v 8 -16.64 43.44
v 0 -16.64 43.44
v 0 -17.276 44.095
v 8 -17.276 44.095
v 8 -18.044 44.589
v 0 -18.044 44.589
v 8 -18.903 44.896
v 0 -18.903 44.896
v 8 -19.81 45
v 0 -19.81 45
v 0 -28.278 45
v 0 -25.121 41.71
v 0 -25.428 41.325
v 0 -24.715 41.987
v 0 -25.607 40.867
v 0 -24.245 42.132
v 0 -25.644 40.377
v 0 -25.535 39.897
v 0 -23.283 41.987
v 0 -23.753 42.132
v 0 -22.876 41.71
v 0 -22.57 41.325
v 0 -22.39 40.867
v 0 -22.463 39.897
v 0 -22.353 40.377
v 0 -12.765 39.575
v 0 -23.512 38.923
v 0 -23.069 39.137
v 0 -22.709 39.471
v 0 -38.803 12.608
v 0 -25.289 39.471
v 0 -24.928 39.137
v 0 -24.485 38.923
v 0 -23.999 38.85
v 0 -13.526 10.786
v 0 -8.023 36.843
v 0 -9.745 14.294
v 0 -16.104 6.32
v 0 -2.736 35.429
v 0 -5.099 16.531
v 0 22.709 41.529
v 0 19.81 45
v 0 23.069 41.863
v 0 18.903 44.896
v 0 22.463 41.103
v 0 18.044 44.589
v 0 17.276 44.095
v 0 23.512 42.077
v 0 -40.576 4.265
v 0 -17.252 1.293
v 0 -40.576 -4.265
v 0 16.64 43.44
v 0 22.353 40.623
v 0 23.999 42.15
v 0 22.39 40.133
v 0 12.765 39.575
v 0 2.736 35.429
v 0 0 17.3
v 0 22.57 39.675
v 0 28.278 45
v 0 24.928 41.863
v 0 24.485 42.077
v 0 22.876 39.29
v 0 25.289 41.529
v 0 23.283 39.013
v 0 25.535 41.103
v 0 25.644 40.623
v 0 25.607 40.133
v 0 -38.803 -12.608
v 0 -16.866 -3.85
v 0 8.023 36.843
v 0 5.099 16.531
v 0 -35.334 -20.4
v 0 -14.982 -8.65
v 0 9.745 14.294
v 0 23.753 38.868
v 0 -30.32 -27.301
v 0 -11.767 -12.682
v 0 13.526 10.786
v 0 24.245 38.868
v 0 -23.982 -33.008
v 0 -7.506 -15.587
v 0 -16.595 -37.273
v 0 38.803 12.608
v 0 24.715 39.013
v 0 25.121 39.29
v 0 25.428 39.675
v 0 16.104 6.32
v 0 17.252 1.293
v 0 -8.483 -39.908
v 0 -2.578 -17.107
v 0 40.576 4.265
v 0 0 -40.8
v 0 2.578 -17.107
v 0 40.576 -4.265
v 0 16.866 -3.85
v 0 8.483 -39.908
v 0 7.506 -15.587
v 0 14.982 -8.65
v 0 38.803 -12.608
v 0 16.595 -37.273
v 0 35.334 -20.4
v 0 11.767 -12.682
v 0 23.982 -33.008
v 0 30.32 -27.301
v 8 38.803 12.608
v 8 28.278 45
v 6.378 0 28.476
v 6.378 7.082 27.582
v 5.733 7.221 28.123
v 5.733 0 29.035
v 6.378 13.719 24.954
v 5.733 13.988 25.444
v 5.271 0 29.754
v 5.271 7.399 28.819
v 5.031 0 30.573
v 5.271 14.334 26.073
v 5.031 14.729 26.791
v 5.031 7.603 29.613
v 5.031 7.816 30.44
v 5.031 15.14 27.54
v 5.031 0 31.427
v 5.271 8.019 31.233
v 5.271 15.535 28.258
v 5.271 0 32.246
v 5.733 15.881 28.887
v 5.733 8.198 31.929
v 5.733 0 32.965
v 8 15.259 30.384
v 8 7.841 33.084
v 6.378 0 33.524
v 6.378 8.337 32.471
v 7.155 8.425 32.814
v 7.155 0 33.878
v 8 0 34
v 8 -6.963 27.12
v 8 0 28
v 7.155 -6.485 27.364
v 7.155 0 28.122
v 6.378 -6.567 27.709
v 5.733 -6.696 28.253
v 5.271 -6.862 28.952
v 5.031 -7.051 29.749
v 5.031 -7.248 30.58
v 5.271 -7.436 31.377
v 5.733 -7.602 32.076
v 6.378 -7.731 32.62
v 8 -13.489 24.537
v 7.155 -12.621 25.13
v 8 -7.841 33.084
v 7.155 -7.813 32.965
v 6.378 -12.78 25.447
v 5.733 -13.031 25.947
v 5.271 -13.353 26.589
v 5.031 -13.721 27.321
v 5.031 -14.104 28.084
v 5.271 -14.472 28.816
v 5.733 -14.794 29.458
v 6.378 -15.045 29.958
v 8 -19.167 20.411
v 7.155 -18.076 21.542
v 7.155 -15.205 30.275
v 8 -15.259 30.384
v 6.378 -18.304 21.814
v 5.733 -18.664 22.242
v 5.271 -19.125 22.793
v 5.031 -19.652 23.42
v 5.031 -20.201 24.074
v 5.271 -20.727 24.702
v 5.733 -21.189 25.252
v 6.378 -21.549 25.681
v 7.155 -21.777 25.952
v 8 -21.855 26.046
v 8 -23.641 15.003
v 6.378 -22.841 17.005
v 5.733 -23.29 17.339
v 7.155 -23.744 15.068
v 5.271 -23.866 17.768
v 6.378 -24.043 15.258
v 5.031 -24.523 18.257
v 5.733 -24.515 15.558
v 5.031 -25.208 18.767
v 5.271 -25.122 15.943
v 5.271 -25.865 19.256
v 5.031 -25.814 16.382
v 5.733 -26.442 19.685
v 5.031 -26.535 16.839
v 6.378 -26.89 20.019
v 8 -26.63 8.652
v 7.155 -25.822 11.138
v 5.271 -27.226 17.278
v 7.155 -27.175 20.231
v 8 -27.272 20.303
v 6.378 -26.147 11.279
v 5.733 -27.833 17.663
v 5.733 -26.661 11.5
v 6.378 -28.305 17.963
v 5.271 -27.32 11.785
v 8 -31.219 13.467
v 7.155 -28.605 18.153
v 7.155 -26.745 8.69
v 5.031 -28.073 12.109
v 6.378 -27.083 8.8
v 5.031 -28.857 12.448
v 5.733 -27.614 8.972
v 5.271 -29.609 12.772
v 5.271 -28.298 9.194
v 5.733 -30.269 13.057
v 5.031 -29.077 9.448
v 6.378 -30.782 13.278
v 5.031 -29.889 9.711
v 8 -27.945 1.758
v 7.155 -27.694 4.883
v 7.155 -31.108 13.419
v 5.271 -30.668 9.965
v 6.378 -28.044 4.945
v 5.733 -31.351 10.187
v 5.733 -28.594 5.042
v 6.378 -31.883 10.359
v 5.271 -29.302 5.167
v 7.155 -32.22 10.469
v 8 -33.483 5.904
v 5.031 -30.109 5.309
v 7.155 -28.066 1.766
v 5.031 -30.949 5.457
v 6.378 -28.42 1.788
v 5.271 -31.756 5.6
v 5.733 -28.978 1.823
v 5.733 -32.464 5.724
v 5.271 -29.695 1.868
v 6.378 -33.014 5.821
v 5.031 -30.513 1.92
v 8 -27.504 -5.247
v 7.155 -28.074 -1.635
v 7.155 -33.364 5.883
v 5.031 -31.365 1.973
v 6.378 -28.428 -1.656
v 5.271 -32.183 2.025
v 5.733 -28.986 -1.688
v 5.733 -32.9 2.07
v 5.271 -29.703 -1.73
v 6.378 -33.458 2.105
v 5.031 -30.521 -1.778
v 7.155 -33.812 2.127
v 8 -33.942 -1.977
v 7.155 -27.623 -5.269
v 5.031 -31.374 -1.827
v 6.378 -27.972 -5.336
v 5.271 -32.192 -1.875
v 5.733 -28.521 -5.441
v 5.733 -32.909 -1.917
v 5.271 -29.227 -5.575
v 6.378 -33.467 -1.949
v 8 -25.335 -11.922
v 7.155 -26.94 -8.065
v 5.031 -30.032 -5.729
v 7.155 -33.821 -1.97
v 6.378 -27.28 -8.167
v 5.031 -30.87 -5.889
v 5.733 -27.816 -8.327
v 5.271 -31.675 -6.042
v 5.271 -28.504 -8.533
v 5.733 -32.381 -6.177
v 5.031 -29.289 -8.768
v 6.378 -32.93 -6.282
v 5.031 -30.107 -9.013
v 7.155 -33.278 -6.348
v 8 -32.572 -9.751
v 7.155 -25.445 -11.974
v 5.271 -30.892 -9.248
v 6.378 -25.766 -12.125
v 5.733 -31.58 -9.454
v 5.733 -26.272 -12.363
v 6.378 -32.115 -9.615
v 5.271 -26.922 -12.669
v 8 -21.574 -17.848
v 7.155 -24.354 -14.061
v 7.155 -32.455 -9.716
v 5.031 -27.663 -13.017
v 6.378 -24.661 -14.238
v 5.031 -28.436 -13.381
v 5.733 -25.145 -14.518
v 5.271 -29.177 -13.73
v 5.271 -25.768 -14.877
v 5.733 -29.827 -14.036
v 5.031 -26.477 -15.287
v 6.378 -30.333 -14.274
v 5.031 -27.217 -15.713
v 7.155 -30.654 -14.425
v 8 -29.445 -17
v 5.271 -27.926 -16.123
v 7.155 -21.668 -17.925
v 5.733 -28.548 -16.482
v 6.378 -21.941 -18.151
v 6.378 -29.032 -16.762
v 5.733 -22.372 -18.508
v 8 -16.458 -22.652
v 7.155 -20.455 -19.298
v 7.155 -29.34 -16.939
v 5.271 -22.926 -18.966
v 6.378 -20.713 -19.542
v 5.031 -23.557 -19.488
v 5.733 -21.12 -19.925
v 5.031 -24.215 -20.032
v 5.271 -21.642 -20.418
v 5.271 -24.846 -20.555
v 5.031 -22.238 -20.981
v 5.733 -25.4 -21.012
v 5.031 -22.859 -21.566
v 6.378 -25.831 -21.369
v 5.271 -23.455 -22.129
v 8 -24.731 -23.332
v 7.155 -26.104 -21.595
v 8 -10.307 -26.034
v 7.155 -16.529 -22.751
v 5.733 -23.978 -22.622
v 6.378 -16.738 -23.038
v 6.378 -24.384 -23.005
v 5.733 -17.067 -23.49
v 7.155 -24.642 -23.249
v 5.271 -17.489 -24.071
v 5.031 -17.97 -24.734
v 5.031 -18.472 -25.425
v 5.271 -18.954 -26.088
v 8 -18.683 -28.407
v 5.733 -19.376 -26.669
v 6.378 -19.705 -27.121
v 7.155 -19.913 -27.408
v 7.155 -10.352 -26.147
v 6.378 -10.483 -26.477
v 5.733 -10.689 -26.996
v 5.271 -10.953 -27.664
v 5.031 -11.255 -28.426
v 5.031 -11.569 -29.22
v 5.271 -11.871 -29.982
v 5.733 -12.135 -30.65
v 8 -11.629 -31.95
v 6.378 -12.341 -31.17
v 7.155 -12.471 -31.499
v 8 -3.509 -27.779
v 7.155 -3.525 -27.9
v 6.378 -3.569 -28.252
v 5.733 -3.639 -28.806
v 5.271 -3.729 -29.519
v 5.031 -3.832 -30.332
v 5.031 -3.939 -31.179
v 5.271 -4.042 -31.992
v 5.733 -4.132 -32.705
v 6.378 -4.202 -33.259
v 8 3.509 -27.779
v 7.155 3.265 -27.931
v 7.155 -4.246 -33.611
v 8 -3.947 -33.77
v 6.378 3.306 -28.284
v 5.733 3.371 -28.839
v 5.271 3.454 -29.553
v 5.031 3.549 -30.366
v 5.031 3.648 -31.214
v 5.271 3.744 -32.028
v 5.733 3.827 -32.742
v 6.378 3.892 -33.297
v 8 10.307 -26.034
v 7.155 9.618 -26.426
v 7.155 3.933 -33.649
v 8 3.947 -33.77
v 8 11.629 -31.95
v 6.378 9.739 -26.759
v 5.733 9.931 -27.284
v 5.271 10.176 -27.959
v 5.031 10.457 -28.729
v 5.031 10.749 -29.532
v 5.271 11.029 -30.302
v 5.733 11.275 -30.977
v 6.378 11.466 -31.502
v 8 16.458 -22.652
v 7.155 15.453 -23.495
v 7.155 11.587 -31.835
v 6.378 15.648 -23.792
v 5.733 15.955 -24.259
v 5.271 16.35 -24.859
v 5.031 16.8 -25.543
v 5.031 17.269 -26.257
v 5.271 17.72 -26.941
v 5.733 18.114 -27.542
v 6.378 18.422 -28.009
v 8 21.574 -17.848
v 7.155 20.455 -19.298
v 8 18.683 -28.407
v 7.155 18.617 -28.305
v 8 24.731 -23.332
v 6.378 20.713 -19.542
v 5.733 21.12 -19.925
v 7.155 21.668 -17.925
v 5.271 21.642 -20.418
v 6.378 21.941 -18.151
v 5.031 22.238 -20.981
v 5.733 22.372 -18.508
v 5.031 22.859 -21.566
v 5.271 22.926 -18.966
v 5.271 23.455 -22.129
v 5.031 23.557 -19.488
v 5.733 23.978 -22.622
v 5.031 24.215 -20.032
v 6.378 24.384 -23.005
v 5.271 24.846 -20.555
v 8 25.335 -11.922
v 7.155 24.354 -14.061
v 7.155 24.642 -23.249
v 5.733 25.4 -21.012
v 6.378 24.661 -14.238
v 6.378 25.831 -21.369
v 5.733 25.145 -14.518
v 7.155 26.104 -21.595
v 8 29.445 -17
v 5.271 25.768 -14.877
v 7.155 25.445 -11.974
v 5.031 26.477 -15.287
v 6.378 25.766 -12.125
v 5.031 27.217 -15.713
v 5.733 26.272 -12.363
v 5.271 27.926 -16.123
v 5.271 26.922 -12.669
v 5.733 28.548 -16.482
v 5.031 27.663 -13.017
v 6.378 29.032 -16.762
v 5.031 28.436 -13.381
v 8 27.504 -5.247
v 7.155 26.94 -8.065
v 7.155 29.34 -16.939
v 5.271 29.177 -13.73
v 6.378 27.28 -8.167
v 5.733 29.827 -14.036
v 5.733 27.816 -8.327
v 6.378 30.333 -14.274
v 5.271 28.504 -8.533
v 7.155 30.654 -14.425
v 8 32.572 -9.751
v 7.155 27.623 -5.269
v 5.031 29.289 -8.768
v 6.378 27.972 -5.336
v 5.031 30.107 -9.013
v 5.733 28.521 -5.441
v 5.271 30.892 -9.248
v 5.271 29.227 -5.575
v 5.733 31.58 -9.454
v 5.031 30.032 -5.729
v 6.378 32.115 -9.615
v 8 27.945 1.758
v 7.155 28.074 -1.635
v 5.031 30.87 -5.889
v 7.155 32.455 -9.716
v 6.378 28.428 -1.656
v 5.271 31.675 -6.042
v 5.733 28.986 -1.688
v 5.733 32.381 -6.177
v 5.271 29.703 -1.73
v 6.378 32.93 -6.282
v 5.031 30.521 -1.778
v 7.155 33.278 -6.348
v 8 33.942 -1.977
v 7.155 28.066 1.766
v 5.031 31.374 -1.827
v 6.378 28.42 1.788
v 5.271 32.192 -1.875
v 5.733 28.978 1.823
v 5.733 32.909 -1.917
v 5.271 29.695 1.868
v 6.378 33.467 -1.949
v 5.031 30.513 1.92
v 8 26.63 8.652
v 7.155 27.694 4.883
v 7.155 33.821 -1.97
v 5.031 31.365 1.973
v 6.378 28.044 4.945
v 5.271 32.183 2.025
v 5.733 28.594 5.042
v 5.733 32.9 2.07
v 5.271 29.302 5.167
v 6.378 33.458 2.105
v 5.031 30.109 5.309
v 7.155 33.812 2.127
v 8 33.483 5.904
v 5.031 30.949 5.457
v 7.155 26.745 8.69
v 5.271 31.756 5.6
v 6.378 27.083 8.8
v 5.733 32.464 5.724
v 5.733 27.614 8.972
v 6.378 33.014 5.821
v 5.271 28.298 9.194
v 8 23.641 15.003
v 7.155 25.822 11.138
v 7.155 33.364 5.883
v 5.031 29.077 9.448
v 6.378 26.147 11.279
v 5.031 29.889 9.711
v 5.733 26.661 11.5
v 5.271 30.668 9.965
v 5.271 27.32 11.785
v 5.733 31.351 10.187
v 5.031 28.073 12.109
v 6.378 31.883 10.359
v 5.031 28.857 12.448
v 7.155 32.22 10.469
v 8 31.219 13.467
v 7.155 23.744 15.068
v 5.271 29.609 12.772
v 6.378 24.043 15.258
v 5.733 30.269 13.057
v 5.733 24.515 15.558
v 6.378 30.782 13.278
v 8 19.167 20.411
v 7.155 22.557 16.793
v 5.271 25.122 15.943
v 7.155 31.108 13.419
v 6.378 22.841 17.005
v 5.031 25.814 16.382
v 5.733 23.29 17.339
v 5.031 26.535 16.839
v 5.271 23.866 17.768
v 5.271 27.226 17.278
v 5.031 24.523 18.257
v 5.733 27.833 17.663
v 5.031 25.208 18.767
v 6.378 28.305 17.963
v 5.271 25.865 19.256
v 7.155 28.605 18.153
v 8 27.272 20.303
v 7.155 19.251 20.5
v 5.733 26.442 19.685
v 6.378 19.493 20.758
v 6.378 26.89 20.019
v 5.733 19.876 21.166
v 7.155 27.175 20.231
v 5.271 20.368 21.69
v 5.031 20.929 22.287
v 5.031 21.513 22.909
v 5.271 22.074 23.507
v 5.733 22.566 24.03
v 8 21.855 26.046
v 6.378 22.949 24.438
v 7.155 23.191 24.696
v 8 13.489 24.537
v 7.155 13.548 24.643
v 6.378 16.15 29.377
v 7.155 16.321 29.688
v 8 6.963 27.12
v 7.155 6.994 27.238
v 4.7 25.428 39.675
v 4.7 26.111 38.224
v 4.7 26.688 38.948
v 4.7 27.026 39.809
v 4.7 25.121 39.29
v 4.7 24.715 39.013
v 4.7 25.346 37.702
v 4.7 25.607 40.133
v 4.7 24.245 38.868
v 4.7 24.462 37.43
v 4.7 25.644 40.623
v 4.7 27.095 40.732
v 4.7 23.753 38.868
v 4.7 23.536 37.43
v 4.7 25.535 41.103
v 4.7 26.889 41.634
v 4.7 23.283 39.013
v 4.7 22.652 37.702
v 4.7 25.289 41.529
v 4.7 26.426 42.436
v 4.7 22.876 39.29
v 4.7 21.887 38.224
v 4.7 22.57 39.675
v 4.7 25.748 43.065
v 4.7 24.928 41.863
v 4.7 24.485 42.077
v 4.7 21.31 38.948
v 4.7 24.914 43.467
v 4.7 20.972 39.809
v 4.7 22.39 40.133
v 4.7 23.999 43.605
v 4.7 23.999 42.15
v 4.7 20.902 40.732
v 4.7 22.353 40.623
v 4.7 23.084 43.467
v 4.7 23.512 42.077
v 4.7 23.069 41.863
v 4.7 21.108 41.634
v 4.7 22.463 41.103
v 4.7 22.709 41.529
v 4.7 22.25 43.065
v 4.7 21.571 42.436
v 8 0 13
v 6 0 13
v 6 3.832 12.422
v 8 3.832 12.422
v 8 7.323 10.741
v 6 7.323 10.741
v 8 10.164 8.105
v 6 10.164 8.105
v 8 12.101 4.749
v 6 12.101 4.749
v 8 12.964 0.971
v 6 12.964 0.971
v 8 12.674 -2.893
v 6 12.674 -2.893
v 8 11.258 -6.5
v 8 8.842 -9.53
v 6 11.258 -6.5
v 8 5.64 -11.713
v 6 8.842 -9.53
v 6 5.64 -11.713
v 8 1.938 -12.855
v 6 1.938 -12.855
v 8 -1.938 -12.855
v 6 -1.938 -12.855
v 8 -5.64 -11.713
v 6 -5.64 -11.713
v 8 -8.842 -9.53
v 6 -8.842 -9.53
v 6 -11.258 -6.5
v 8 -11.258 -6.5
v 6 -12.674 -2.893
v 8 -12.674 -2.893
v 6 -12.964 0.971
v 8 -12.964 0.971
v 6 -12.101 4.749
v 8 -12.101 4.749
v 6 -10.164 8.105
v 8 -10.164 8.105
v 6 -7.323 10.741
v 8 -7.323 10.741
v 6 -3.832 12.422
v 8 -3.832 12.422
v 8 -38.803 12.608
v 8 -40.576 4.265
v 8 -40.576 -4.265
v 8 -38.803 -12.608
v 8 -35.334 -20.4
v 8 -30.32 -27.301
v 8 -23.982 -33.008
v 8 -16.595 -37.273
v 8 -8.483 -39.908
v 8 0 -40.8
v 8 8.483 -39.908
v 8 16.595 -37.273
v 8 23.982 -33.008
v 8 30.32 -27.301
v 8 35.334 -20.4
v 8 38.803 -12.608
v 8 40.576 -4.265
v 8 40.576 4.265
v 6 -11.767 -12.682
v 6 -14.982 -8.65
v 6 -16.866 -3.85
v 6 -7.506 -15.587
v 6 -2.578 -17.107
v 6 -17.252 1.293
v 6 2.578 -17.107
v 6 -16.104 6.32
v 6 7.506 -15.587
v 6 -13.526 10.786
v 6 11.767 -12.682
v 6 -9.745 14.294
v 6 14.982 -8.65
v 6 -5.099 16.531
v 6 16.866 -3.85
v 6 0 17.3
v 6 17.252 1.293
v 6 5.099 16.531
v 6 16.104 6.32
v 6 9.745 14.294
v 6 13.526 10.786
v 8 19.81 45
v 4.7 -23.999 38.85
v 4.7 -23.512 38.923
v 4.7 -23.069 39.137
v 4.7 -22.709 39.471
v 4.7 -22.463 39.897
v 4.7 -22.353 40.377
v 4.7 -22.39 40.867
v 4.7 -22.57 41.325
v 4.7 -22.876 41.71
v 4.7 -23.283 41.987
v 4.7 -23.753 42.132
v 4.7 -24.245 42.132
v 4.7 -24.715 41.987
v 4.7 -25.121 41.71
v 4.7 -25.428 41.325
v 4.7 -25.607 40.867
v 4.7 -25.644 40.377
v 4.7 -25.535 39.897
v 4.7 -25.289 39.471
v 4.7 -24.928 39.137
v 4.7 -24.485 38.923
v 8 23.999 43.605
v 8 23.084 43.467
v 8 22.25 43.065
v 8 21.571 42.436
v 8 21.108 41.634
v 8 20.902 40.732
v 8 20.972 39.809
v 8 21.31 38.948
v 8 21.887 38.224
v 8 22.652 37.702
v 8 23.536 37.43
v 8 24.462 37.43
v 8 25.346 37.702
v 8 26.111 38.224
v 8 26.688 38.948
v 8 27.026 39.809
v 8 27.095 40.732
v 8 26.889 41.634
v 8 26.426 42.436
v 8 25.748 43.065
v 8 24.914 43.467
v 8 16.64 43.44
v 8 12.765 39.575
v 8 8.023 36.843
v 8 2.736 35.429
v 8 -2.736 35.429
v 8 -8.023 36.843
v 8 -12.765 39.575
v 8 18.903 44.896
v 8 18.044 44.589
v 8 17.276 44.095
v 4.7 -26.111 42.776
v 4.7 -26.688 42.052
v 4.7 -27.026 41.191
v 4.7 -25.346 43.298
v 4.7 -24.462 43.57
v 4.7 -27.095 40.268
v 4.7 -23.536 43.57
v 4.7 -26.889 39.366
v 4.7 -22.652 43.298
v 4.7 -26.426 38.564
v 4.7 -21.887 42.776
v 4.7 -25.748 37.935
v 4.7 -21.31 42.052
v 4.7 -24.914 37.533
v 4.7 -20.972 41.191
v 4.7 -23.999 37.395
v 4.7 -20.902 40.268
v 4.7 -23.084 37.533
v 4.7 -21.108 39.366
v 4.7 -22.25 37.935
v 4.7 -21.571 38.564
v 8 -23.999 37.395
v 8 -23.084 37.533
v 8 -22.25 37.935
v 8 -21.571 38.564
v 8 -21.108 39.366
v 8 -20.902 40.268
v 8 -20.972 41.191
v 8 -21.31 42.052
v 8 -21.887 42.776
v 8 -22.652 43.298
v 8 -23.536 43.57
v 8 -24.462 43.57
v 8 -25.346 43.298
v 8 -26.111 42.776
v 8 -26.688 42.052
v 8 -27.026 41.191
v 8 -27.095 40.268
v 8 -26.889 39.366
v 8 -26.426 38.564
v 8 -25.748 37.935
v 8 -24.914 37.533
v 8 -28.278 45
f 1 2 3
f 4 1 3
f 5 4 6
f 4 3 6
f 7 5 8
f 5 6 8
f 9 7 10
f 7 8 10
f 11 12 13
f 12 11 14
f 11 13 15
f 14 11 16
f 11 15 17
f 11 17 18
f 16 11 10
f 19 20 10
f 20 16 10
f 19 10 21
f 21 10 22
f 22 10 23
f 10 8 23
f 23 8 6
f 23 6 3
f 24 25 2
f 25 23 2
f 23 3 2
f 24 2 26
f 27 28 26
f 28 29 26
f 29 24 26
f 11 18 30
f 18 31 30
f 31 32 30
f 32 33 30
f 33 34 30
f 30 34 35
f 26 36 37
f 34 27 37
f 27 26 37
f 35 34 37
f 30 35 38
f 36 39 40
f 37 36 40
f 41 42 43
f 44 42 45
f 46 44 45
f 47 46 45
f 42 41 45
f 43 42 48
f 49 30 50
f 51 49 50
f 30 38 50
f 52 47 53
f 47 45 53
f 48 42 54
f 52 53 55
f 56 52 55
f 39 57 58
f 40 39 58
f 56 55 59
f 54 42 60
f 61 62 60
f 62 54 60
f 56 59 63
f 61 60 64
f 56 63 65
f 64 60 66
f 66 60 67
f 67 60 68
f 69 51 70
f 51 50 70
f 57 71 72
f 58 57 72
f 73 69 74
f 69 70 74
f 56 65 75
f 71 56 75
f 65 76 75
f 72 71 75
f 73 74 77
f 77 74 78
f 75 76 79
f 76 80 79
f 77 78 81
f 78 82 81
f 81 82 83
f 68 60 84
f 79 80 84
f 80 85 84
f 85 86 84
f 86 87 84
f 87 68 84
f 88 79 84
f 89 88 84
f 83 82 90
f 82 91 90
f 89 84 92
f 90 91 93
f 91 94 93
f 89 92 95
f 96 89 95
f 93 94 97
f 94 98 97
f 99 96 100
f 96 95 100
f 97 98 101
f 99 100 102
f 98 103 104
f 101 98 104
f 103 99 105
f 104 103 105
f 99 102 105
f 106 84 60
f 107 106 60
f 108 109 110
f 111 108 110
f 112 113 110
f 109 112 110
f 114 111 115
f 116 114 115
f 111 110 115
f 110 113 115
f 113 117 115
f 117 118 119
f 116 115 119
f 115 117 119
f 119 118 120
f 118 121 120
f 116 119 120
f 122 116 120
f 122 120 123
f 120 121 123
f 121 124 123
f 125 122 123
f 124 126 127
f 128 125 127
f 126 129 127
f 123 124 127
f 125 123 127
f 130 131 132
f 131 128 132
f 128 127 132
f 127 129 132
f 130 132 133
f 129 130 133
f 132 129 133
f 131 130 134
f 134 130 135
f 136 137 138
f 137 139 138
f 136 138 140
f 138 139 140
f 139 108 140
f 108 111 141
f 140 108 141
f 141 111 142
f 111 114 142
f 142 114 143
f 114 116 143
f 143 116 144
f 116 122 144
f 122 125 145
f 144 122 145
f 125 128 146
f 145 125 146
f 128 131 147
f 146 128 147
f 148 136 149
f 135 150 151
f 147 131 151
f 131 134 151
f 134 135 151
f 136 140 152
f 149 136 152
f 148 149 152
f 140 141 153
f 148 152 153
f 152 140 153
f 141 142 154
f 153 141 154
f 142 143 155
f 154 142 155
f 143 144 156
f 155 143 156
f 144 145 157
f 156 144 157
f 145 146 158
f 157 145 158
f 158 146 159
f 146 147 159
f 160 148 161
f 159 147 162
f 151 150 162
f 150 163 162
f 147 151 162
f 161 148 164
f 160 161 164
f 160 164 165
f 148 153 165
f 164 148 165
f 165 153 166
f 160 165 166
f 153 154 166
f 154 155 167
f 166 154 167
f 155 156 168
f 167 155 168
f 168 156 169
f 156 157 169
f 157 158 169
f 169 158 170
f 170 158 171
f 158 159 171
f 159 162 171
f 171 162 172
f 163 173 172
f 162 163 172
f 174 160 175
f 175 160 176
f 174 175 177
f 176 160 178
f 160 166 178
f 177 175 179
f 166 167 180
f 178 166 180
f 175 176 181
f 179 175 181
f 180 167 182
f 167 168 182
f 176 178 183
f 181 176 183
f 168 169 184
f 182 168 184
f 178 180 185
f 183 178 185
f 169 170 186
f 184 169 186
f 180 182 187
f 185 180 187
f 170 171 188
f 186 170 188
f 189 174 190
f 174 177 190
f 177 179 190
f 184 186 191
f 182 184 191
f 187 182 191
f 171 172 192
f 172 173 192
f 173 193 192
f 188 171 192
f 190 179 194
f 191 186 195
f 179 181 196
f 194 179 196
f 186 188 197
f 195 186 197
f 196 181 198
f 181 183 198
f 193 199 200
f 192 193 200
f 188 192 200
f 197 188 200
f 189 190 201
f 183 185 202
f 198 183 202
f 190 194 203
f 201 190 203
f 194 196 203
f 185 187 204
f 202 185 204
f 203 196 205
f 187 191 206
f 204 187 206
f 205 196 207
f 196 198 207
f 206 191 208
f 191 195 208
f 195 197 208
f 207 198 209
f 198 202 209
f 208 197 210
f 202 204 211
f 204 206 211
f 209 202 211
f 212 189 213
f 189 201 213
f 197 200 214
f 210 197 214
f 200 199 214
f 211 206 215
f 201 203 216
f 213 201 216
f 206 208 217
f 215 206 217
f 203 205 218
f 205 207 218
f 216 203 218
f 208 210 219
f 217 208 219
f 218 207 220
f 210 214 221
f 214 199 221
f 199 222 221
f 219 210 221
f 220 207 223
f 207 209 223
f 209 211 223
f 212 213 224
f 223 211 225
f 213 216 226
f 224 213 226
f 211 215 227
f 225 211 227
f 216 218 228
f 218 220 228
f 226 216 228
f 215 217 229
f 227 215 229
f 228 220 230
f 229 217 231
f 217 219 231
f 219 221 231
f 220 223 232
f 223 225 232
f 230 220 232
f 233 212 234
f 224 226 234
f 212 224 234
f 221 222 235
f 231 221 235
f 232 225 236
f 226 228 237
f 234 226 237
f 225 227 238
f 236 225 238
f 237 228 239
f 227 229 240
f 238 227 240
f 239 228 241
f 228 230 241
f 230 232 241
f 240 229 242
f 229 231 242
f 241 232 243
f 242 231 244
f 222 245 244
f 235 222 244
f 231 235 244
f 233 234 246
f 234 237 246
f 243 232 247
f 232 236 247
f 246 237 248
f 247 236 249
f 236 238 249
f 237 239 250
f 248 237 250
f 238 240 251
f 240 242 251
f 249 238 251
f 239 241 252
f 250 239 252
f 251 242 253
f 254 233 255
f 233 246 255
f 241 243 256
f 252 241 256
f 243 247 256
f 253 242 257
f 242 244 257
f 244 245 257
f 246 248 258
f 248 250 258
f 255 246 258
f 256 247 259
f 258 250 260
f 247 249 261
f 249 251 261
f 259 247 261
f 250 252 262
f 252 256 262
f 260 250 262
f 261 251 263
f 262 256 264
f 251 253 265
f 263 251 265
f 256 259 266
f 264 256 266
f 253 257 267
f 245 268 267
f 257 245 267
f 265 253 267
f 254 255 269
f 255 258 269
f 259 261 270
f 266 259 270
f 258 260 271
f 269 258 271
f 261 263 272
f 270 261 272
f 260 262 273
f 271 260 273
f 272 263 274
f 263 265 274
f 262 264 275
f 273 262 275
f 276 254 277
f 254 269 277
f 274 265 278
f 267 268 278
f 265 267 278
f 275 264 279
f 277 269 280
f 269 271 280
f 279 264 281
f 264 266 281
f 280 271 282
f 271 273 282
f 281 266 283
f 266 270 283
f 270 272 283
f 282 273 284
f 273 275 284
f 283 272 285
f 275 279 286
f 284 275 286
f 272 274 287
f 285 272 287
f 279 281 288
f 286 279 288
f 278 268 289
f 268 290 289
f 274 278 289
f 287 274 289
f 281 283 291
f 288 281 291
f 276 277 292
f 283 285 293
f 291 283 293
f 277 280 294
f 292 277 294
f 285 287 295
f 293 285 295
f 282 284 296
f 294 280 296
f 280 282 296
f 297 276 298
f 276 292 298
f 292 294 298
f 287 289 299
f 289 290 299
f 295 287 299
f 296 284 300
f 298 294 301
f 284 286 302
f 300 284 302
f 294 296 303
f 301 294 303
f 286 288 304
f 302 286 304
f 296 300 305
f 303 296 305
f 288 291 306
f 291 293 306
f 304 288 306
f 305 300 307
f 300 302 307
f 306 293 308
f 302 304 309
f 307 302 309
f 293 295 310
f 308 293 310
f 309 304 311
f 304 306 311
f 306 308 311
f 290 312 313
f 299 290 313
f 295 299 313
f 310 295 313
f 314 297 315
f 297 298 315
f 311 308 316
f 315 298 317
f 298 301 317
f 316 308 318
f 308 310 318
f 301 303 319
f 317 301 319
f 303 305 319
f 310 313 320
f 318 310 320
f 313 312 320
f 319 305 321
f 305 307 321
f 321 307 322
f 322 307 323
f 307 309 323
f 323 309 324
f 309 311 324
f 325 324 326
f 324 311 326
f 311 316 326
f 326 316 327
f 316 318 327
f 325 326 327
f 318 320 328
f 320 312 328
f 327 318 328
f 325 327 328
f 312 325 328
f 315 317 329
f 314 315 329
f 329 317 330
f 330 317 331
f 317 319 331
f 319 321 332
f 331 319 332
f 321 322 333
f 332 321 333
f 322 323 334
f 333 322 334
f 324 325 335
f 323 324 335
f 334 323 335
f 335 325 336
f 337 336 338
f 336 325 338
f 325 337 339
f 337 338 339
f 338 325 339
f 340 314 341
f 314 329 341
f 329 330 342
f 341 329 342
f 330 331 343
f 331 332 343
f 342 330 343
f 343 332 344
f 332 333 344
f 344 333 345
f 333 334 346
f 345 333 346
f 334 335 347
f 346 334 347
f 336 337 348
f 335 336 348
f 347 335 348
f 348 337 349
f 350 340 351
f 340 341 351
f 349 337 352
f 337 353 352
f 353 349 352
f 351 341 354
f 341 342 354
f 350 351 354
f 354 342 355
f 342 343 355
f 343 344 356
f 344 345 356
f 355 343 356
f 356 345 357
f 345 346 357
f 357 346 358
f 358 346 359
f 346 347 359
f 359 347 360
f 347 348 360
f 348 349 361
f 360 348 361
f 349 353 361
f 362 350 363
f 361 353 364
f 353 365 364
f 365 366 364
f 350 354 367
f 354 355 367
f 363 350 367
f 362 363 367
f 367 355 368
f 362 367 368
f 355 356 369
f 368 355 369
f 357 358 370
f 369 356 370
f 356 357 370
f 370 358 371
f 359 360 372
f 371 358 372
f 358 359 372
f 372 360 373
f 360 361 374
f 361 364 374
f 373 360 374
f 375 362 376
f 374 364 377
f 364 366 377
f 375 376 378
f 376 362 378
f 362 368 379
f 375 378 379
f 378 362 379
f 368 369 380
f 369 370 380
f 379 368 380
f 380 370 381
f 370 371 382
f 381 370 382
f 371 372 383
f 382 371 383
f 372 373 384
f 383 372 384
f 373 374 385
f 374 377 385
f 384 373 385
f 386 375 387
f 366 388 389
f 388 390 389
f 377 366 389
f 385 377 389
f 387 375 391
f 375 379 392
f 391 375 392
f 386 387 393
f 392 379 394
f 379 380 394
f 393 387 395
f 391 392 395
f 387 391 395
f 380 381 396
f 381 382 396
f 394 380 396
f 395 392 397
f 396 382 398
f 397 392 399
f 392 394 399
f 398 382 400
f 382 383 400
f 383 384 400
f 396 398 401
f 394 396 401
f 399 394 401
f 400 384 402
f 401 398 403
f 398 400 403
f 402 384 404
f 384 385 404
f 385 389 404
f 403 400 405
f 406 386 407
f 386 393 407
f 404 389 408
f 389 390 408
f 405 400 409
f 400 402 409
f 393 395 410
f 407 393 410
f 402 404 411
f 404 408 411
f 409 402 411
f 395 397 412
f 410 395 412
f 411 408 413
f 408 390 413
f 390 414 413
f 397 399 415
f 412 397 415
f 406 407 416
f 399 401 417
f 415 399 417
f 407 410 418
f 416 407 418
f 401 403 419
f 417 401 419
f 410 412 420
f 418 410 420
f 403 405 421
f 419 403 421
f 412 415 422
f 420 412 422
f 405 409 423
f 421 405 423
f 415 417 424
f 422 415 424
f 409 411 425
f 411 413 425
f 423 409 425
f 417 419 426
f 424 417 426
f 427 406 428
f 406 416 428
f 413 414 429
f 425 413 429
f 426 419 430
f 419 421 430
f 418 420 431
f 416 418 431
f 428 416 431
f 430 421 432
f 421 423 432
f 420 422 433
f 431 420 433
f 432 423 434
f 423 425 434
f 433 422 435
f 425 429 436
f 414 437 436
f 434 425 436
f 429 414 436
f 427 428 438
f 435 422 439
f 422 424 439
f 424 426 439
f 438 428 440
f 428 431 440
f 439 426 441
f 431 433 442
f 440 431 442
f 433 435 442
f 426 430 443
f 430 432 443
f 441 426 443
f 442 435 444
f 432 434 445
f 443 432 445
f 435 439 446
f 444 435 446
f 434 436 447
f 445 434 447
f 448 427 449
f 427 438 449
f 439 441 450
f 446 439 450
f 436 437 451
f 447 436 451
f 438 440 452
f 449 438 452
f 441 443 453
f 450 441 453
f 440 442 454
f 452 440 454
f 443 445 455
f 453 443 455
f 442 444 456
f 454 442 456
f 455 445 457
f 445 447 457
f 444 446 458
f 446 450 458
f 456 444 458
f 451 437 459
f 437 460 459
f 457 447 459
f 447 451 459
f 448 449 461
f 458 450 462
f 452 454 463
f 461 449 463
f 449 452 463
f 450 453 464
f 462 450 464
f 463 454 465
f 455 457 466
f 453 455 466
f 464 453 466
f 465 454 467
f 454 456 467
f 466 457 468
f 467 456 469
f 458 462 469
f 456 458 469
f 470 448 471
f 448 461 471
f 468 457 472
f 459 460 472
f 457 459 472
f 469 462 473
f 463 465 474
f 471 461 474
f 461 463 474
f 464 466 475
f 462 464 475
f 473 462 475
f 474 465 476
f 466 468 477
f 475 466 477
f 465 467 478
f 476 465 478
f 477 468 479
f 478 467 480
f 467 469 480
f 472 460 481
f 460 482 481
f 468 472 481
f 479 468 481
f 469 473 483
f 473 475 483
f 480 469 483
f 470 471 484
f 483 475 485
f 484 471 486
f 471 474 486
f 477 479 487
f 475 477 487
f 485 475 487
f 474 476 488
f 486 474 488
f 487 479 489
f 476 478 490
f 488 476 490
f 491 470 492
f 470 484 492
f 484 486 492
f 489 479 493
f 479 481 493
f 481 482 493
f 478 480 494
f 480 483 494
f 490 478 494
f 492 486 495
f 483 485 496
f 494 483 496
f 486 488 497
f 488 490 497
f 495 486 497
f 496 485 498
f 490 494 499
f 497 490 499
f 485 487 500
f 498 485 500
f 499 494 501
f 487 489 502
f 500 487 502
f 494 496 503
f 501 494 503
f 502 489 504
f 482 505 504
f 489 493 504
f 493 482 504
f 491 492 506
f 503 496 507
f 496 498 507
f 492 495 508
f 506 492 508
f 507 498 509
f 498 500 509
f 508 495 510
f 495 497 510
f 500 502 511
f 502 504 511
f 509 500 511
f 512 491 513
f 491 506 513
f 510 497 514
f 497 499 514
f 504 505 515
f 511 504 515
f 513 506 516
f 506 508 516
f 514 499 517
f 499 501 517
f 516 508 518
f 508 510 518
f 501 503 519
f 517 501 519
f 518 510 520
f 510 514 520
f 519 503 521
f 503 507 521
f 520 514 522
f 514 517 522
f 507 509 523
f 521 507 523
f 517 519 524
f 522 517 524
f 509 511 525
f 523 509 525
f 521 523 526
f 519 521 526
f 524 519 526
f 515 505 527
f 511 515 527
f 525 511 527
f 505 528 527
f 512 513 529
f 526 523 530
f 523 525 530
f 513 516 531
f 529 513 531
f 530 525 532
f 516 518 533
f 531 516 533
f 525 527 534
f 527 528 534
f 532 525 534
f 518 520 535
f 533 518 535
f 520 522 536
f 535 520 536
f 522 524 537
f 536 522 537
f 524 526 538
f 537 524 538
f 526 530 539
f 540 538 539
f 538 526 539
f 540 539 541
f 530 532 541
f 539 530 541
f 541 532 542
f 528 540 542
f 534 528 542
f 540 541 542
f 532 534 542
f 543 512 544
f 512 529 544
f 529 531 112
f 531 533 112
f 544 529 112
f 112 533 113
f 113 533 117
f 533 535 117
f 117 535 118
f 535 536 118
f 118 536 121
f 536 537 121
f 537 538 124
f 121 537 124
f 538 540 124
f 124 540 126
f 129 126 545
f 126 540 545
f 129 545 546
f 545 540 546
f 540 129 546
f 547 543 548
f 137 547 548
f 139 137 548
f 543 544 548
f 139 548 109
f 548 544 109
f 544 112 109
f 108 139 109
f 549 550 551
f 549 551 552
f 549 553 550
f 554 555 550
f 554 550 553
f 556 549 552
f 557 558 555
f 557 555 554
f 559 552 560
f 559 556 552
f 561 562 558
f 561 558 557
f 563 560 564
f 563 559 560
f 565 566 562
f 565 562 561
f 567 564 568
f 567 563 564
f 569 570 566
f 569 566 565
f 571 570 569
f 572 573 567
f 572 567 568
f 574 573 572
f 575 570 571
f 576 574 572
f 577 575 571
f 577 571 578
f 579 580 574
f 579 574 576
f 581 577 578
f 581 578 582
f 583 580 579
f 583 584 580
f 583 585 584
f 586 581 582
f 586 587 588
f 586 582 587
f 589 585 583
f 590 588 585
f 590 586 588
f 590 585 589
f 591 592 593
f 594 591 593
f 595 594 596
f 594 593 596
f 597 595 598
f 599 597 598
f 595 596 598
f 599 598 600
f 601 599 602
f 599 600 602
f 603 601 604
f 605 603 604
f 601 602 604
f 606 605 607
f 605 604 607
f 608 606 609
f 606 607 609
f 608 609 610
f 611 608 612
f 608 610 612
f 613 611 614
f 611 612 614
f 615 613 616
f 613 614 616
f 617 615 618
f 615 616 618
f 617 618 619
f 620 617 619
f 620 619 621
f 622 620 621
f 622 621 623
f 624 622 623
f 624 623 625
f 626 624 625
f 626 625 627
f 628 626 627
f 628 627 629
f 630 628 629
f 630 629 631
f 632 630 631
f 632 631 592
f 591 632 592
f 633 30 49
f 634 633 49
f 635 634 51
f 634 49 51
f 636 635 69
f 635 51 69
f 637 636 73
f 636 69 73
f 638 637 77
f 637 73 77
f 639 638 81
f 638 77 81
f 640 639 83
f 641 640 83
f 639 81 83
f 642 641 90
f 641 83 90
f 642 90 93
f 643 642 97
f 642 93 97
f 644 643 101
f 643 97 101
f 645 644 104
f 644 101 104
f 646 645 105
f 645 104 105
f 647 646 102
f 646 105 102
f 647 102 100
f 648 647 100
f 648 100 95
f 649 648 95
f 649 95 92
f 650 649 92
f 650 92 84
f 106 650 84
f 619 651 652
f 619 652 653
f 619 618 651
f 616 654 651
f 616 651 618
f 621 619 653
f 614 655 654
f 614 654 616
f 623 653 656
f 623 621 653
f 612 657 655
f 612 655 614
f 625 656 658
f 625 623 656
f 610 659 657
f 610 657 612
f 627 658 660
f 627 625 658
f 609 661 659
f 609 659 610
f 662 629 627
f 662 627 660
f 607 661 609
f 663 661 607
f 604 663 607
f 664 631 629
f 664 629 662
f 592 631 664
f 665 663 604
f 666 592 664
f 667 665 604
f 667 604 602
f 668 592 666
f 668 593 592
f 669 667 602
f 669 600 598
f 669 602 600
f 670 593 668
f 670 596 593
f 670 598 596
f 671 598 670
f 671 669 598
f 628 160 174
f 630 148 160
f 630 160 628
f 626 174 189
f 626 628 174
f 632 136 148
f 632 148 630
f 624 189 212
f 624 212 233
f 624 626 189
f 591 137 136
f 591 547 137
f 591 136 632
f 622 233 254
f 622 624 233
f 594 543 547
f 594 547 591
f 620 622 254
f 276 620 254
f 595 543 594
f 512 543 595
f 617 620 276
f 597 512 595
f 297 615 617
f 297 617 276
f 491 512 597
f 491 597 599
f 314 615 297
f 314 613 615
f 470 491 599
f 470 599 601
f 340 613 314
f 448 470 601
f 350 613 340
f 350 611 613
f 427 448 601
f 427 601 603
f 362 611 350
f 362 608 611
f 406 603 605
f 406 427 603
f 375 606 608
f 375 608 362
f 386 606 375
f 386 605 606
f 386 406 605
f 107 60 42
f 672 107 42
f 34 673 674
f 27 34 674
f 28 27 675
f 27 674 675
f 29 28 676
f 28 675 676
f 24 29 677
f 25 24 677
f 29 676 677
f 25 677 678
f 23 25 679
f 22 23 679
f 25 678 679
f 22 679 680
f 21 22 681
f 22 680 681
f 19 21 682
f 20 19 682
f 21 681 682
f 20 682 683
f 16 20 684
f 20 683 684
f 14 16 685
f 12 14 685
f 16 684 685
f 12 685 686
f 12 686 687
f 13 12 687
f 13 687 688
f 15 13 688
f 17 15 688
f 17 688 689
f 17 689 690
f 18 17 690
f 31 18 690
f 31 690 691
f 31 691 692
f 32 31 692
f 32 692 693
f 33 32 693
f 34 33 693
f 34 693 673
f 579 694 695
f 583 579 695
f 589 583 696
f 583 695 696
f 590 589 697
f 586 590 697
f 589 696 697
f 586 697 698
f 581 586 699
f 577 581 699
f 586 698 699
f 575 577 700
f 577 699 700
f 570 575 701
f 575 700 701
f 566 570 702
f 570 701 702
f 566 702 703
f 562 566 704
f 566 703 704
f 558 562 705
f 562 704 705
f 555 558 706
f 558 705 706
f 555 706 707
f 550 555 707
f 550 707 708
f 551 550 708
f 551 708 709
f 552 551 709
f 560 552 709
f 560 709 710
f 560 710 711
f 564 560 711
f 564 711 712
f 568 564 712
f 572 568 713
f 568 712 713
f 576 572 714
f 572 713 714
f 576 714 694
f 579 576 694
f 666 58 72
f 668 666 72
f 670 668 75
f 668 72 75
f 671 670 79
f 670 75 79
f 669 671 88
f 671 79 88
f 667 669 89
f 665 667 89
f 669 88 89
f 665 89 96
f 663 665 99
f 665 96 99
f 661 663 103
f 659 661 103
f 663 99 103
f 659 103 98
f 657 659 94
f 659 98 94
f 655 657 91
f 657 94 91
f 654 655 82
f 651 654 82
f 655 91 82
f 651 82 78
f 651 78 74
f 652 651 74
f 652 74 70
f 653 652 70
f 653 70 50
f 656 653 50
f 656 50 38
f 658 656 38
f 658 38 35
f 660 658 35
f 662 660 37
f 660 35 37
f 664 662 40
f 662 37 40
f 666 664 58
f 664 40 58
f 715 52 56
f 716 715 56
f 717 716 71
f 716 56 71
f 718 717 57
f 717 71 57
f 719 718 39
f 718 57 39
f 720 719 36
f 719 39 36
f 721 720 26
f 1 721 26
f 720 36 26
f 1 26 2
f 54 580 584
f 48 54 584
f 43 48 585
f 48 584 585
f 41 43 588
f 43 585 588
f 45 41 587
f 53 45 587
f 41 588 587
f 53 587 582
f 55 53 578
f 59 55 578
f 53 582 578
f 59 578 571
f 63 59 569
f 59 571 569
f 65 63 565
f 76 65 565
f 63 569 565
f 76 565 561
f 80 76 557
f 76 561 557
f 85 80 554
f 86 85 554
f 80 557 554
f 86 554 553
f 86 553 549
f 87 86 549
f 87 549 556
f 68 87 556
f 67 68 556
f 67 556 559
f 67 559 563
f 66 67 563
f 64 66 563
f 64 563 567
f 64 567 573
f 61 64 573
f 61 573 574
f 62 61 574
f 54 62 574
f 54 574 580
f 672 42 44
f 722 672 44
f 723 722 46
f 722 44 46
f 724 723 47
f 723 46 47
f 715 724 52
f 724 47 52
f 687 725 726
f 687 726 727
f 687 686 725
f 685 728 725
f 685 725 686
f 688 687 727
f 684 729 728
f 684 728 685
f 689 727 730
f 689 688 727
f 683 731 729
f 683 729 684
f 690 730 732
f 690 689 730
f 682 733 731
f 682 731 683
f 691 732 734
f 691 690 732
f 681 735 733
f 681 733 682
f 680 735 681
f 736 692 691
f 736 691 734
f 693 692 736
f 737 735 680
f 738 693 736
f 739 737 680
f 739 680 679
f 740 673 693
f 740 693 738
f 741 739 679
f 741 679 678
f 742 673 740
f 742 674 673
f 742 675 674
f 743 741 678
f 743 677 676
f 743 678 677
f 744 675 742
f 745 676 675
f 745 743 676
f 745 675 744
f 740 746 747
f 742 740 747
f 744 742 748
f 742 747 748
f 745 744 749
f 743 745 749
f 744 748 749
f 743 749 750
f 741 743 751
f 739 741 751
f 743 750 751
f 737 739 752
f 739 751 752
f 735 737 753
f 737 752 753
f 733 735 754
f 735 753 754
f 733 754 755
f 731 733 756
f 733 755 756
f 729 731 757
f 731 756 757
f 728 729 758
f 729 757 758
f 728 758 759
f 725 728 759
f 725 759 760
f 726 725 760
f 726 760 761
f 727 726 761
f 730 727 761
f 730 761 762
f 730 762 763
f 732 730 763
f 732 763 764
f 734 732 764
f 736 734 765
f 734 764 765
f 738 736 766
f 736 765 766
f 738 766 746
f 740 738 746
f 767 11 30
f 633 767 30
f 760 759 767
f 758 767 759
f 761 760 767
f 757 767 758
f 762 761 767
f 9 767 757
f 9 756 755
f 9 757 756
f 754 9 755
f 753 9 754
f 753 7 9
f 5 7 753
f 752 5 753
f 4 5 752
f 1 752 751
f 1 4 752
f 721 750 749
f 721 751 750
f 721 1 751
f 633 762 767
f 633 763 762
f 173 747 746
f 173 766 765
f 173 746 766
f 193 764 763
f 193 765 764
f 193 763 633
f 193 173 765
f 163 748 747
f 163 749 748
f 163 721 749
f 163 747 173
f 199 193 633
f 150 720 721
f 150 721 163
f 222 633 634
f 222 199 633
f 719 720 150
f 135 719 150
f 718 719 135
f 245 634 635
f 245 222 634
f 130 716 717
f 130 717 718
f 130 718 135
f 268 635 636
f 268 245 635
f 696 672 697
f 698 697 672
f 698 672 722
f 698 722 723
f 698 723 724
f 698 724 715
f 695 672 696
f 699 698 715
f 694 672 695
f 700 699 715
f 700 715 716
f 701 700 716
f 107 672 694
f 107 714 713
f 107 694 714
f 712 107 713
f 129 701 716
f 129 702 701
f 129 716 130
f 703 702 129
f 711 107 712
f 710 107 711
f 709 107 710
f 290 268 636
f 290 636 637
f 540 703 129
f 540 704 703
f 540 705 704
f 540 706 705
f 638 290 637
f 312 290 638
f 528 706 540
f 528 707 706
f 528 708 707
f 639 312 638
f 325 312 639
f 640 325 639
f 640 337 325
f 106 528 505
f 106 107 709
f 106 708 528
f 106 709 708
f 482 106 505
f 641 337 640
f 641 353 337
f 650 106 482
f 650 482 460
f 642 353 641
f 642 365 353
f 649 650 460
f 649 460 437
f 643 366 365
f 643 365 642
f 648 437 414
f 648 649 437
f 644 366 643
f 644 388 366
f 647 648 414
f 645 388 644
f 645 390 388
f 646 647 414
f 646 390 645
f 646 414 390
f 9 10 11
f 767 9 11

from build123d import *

# Parameters (mm, degrees)
EXTRUDE_1_DEPTH     = 8
SKETCH_4_R          = 3.105
CUT_EXTRUDE_1_DEPTH = 3.3
SKETCH_5_R          = 1.65
CUT_EXTRUDE_2_DEPTH = 61.923969011
SKETCH_6_R          = 17.3
CUT_EXTRUDE_3_DEPTH = 6
SKETCH_7_R          = 13
CUT_EXTRUDE_4_DEPTH = 62.038020938


with BuildPart() as part:
    # 草图1 → 凸台-拉伸1 (new body)
    with BuildSketch(Plane(origin=(0, 0, 0), x_dir=(0, 0, -1), z_dir=(1, 0, 0))):
        with BuildLine():
            Line((-45, -19.810035336), (-45, -28.278272418))
            Line((-45, -28.278272418), (-12.60789337, -38.803105865))
            ThreePointArc((-12.60789337, -38.803105865), (40.8, 0), (-12.60789337, 38.803105865))
            Line((-12.60789337, 38.803105865), (-45, 28.278272418))
            Line((-45, 28.278272418), (-45, 19.810035336))
            ThreePointArc((-45, 19.810035336), (-44.588871689, 18.043683162), (-43.44, 16.640429682))
            ThreePointArc((-43.44, 16.640429682), (-35.25, 0), (-43.44, -16.640429682))
            ThreePointArc((-43.44, -16.640429682), (-44.588871689, -18.043683162), (-45, -19.810035336))
        make_face()
    extrude(amount=EXTRUDE_1_DEPTH)

    # 草图3 → 切除-旋转1 (revolve, cut)
    with BuildSketch(Plane(origin=(0, 0, 0), x_dir=(1, 0, 0), z_dir=(0, 1, 0)), mode=Mode.PRIVATE) as cut_revolve_1_sk:
        with BuildLine():
            Line((8, 34), (8, 28))
            ThreePointArc((8, 28), (5, 31), (8, 34))
        make_face()
    revolve(cut_revolve_1_sk.sketch.rotate(Axis((0, 0, 0), (1, 0, 0)), 180), axis=Axis((0, 0, 0), (1, 0, 0)), mode=Mode.SUBTRACT)

    # 草图4 → 切除-拉伸1 (cut)
    with BuildSketch(Plane(origin=(8, 0, 0), x_dir=(0, 0, -1), z_dir=(1, 0, 0))):
        with Locations((-40.5, -23.998774784)):
            Circle(SKETCH_4_R)
        with Locations(Location((-40.5, 23.998774784, 0), (0, 0, 180))):
            Circle(SKETCH_4_R)
    extrude(amount=-CUT_EXTRUDE_1_DEPTH, mode=Mode.SUBTRACT)

    # 草图5 → 切除-拉伸2 (cut, through all)
    with BuildSketch(Plane(origin=(4.7, 0, 0), x_dir=(0, 0, -1), z_dir=(1, 0, 0))):
        with Locations((-40.5, -23.998774784)):
            Circle(SKETCH_5_R)
        with Locations(Location((-40.5, 23.998774784, 0), (0, 0, 180))):
            Circle(SKETCH_5_R)
    extrude(amount=-CUT_EXTRUDE_2_DEPTH, mode=Mode.SUBTRACT)

    # 草图6 → 切除-拉伸3 (cut)
    with BuildSketch(Plane.ZY):
        Circle(SKETCH_6_R)
    extrude(amount=-CUT_EXTRUDE_3_DEPTH, mode=Mode.SUBTRACT)

    # 草图7 → 切除-拉伸4 (cut, through all)
    with BuildSketch(Plane.ZY.offset(-6)):
        Circle(SKETCH_7_R)
    extrude(amount=-CUT_EXTRUDE_4_DEPTH, mode=Mode.SUBTRACT)


solid = part.part
